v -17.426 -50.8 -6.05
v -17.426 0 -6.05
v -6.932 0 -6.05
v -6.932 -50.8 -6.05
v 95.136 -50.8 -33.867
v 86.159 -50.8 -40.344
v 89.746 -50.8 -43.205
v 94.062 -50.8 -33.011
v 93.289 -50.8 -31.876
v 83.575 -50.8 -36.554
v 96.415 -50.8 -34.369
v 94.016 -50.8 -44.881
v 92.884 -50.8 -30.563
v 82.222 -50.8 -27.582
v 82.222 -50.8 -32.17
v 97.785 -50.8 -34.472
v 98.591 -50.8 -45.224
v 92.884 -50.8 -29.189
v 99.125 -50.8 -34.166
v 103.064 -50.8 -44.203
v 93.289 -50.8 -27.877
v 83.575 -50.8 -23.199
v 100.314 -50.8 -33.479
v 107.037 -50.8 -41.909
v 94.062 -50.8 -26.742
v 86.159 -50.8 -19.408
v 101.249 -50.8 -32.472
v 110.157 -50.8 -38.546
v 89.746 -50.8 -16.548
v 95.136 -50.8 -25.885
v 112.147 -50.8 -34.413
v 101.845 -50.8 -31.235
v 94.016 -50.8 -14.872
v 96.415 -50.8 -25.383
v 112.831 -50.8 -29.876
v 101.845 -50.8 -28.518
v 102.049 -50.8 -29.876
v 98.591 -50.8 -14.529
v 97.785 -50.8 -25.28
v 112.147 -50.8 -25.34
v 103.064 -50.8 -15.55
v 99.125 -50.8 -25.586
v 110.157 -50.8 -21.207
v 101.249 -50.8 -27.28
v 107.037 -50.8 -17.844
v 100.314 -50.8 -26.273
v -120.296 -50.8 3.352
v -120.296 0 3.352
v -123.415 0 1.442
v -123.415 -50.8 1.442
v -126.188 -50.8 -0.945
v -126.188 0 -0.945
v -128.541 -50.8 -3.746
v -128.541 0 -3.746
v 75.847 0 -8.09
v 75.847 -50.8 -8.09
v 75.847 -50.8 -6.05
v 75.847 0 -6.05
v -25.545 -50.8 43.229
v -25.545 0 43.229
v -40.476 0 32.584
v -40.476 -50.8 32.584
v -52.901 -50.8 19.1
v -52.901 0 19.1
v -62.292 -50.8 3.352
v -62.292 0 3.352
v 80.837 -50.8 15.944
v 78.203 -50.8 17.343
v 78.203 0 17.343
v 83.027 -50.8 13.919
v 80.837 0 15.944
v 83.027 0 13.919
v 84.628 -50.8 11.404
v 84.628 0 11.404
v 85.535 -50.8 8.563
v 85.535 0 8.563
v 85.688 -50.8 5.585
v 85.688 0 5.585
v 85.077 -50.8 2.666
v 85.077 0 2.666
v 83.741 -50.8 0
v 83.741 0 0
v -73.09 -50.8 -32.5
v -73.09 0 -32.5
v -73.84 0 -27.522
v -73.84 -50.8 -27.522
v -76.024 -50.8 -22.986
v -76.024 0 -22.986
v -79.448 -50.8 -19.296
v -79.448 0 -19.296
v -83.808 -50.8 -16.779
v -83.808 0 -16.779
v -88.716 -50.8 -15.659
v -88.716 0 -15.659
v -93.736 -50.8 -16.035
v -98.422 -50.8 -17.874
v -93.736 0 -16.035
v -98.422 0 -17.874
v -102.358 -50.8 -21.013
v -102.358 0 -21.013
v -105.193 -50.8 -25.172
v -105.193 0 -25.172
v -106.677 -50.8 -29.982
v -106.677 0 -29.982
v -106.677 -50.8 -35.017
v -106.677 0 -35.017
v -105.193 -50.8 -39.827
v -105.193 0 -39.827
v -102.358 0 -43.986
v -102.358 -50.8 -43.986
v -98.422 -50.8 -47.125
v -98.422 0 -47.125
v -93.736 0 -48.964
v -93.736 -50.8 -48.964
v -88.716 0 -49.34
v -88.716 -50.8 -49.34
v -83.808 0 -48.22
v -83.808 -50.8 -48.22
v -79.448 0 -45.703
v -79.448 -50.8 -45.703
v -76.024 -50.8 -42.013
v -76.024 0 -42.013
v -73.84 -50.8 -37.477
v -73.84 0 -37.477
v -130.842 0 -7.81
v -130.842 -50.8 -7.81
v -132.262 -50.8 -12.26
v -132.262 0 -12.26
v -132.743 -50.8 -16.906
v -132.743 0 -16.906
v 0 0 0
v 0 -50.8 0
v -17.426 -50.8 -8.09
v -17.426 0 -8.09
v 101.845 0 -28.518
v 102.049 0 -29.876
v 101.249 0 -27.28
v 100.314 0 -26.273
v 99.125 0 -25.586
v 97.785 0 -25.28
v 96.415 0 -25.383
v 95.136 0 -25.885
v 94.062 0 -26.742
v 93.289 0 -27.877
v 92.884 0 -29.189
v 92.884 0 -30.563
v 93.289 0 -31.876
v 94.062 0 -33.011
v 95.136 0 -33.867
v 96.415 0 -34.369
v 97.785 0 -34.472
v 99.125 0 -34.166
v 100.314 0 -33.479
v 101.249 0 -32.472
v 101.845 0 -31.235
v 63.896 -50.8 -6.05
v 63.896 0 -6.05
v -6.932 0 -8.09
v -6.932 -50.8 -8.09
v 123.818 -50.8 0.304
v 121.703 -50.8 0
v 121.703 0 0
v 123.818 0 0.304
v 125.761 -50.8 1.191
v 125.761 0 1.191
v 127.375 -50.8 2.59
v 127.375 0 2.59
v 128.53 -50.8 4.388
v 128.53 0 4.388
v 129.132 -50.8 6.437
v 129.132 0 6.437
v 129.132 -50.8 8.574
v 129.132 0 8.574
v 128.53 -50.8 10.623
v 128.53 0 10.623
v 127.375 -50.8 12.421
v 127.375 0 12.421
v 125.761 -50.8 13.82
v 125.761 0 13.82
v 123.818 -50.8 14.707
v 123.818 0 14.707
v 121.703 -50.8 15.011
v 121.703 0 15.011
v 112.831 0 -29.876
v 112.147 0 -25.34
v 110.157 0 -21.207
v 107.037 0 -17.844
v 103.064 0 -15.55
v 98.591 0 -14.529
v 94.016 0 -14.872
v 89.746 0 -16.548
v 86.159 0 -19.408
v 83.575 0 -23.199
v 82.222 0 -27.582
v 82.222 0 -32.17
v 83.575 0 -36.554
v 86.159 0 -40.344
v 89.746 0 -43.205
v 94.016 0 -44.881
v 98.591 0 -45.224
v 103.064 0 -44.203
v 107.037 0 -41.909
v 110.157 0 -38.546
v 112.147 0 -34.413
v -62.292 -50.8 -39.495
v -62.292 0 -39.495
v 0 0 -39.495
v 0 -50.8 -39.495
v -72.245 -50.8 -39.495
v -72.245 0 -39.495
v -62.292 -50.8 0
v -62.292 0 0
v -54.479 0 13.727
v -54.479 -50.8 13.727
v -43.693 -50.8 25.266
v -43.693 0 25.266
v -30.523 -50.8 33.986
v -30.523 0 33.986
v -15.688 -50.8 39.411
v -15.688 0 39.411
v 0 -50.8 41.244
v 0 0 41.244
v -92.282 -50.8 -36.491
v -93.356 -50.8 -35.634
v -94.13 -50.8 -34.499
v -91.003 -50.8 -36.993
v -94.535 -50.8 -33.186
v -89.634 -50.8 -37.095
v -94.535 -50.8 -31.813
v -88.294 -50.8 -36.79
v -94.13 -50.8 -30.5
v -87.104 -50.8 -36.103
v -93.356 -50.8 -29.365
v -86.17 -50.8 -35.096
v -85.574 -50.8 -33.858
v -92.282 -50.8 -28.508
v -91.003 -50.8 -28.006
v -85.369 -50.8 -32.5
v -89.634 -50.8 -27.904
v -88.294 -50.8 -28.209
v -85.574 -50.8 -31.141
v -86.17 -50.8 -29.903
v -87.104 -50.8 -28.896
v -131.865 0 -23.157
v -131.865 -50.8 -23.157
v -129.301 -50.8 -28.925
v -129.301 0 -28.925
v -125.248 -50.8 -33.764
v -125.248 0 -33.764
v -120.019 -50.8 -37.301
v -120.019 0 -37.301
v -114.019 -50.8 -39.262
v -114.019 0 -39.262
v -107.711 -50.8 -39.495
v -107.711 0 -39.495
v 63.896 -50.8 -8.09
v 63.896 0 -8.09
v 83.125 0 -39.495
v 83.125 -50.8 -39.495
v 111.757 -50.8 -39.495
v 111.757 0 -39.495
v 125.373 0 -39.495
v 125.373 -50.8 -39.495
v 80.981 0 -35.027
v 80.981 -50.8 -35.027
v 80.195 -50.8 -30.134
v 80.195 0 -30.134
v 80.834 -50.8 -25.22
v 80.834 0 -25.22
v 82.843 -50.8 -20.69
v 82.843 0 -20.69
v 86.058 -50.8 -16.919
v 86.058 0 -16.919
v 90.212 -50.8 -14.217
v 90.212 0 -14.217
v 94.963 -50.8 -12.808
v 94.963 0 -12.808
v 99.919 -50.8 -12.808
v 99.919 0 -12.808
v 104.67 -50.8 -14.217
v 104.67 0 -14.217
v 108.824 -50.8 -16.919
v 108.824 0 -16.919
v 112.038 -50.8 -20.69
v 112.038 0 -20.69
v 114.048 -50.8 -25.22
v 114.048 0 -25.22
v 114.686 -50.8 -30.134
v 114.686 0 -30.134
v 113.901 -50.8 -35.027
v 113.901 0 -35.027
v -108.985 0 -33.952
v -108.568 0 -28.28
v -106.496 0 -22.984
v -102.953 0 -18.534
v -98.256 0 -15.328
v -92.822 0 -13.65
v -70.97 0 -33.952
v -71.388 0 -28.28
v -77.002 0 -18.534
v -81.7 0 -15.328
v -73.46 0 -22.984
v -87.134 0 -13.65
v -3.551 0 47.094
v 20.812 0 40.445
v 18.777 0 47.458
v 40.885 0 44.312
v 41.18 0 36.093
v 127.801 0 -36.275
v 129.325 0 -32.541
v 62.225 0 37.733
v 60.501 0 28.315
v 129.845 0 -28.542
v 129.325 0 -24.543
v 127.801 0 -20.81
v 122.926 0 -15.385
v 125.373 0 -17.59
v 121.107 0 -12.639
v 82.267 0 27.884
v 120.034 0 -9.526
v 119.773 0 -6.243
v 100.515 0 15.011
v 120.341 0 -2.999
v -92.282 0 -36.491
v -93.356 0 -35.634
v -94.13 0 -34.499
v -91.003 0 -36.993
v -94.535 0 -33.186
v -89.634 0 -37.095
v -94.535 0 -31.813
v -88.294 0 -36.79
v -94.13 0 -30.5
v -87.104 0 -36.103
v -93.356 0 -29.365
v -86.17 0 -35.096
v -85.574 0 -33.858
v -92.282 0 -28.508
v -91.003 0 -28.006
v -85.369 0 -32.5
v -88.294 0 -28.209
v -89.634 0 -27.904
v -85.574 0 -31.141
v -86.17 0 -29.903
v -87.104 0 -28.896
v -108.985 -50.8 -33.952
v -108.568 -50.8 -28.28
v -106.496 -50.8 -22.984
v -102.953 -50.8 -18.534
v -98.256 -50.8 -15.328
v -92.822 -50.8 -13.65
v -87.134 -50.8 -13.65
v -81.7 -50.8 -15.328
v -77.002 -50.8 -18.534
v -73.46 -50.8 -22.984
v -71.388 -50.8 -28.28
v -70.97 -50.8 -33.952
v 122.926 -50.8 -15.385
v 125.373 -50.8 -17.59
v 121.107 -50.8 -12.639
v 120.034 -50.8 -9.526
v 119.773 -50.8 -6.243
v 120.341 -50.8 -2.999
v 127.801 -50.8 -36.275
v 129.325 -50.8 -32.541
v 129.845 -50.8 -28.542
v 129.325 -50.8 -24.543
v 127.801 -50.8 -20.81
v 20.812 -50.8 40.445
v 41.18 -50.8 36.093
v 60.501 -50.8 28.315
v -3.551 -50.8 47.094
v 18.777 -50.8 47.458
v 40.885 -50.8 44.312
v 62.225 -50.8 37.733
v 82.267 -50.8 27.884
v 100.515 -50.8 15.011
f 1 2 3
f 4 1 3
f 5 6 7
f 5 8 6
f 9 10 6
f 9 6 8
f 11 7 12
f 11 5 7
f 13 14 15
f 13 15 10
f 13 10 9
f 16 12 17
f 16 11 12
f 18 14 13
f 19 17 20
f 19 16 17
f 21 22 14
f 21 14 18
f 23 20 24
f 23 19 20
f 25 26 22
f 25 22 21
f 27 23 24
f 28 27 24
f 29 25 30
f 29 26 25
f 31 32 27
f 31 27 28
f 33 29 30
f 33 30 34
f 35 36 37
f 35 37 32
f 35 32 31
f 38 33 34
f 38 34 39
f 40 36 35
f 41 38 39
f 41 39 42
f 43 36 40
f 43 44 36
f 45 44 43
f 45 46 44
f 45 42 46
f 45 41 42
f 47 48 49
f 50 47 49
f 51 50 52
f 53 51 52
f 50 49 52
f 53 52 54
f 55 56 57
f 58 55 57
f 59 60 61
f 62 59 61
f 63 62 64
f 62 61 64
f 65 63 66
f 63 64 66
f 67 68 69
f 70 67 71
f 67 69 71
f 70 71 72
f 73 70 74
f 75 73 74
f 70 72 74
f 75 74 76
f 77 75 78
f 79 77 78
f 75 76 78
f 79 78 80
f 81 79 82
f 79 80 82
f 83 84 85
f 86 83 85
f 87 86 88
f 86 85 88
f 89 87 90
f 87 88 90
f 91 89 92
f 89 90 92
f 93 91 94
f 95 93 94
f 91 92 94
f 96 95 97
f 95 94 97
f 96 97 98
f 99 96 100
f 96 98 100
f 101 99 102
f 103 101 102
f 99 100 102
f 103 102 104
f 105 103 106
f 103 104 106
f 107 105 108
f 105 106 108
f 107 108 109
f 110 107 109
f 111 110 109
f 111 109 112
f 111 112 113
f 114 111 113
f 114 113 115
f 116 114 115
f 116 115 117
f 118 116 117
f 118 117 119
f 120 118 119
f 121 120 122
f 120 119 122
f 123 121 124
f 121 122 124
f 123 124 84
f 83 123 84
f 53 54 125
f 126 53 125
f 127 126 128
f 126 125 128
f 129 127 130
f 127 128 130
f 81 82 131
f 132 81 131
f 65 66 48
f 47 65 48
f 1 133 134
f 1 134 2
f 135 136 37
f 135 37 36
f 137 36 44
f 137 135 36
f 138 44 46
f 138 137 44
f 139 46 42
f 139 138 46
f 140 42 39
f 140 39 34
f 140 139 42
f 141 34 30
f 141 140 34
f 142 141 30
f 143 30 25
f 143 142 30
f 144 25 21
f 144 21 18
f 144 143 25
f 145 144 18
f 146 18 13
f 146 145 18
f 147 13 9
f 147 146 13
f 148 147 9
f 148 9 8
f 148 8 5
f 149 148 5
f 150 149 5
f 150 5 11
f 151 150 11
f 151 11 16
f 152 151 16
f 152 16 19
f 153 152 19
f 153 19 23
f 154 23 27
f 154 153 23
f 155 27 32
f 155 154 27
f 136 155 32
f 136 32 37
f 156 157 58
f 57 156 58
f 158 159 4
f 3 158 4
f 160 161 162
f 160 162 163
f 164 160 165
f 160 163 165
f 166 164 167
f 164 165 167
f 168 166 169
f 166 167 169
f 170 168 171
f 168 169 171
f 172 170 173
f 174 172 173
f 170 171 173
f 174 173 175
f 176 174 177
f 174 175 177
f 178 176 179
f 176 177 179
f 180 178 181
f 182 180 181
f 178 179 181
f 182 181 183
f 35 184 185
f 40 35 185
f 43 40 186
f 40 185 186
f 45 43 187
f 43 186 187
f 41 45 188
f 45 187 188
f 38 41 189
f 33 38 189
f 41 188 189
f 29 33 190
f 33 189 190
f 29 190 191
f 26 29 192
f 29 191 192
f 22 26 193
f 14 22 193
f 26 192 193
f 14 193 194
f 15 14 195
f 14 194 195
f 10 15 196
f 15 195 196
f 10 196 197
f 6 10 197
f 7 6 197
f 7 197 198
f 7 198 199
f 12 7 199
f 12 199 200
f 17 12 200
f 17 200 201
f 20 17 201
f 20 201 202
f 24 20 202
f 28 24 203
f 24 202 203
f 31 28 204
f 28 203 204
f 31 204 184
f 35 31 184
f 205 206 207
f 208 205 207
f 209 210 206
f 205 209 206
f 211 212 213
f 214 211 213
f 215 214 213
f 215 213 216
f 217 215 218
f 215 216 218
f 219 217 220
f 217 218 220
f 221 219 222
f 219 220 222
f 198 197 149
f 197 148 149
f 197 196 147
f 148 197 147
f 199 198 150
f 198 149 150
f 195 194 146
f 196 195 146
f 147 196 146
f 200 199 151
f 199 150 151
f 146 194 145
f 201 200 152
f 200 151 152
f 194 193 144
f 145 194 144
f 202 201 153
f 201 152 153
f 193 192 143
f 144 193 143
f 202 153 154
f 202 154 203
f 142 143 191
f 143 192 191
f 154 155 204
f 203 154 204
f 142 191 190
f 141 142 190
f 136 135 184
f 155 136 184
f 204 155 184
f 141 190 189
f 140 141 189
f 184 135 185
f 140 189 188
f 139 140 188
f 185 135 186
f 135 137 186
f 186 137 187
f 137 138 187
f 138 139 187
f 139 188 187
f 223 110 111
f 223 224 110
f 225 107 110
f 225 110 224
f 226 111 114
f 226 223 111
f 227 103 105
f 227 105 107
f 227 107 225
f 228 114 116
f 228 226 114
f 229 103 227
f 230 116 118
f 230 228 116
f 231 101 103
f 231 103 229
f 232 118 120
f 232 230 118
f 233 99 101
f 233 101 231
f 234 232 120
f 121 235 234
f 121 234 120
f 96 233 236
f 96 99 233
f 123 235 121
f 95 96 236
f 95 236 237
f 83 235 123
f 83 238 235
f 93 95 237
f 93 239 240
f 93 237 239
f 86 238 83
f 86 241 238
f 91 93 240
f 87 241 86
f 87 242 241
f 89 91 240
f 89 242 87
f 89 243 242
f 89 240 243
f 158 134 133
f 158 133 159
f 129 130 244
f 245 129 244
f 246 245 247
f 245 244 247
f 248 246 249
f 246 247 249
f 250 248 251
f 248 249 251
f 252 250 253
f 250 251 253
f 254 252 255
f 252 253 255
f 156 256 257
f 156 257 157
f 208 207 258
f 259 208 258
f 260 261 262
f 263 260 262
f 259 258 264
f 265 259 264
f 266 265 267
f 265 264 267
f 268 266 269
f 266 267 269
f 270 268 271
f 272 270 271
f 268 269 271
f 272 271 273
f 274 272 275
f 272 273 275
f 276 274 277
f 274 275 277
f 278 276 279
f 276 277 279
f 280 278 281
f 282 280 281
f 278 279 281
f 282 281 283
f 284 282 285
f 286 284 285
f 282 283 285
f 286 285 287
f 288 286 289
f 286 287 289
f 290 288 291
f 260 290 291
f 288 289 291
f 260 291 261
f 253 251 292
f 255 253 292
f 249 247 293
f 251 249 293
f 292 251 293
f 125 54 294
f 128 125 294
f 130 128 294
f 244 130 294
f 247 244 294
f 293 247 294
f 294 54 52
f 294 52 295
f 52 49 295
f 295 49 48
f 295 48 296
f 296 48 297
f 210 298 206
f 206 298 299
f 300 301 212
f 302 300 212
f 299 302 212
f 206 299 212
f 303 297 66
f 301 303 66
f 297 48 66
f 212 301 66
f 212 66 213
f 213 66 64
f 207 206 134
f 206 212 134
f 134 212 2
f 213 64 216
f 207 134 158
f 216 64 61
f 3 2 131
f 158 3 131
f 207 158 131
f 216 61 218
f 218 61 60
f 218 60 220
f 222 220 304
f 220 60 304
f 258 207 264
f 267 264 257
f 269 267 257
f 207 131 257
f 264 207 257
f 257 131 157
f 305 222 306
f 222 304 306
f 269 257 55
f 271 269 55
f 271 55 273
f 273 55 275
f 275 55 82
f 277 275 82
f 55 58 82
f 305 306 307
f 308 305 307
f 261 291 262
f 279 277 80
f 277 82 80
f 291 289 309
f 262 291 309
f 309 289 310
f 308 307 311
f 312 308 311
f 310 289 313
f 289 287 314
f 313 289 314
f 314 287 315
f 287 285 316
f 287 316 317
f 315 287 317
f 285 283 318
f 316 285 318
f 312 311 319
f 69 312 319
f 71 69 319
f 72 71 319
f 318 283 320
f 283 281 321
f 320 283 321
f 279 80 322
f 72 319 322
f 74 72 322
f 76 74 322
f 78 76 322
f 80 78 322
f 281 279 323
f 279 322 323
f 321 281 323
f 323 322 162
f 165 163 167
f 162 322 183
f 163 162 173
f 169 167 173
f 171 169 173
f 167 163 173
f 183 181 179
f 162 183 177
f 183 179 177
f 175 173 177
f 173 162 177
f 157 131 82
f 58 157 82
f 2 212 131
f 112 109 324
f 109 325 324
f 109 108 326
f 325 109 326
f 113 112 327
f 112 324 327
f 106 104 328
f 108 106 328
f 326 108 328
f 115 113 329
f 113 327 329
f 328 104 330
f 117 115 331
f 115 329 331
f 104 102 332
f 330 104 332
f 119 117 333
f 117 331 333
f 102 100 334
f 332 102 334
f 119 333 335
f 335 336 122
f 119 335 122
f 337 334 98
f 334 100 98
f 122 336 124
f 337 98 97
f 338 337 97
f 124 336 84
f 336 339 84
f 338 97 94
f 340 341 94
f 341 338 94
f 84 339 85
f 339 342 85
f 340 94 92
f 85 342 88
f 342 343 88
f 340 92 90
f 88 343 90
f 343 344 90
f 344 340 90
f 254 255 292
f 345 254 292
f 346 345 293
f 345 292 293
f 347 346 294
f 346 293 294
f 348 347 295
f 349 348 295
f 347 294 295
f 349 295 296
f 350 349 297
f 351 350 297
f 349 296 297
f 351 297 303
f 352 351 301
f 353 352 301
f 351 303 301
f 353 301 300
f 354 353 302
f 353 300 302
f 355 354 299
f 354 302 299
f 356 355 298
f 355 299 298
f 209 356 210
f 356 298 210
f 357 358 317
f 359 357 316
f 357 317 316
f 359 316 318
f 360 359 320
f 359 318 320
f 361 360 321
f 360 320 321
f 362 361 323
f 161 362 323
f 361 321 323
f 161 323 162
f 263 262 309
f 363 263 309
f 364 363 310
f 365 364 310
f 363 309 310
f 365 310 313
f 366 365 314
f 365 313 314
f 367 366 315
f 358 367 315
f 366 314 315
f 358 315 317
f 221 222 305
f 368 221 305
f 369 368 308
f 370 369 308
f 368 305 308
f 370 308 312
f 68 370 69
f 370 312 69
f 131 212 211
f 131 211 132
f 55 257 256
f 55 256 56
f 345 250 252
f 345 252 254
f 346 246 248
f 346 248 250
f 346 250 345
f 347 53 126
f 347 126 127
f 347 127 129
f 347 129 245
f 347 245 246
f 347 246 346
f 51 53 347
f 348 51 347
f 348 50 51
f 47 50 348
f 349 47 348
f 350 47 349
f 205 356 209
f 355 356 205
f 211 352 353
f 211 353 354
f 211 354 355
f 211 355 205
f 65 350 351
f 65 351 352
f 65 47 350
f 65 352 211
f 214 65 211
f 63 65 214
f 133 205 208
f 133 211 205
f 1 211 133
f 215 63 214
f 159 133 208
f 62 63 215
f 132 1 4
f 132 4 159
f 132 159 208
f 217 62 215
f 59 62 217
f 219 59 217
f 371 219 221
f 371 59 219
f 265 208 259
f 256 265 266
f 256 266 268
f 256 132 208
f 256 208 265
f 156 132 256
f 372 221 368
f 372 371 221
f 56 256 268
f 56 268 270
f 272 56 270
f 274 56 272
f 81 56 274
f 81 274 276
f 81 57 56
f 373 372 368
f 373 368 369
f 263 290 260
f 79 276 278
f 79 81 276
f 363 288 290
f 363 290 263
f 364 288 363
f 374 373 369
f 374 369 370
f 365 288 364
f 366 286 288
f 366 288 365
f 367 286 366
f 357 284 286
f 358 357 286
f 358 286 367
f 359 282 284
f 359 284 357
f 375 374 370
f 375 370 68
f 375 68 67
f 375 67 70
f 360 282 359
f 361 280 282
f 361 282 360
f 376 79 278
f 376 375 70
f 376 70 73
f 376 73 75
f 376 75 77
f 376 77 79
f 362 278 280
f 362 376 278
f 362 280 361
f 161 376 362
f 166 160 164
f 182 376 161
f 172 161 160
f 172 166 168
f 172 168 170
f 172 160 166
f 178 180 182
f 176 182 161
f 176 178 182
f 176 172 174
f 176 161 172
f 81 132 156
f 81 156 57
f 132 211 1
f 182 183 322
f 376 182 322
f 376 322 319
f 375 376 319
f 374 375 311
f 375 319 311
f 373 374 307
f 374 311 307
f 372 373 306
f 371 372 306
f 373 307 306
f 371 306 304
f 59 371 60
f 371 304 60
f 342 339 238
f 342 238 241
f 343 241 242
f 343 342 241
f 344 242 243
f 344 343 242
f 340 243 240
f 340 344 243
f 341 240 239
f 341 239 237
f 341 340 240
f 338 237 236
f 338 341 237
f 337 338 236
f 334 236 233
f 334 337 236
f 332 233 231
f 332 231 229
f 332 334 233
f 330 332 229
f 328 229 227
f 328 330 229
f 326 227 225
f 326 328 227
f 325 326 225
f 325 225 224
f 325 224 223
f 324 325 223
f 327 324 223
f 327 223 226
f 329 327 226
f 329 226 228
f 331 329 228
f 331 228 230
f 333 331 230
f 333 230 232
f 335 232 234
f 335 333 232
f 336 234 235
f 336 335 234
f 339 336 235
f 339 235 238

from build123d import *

# Parameters (mm, degrees)
F0_R     = 16.887977
F0_R_2   = 4.608627
F0_R_3   = 15.390351
F0_R_4   = 4.608633
F0_W     = 11.950485
F0_H     = 2.040328
F0_W_2   = 62.29246
F0_H_2   = 39.494921
F0_W_3   = 10.493115
F1_DEPTH = 50.8


with BuildPart() as f1:
    # F0 (on Front) → F1 (new body)
    with BuildSketch(Plane.XZ):
        with BuildLine():
            Line((-103.385788, -3.745581), (-128.54061, -3.745581))
            ThreePointArc((-128.54061, -3.745581), (-131.66662, -9.998291), (-132.742612, -16.905574))
            Line((-132.742612, -16.905574), (-110.034121, -16.905574))
            ThreePointArc((-110.034121, -16.905574), (-104.690656, -11.345713), (-103.385788, -3.745581))
        make_face()
        with Locations((-89.97792, -32.499507)):
            Circle(F0_R)
        with Locations((-89.97792, -32.499507)):
            Circle(F0_R_2, mode=Mode.SUBTRACT)
        with Locations((97.440779, -29.87623)):
            Circle(F0_R_3)
        with Locations((97.440779, -29.87623)):
            Circle(F0_R_4, mode=Mode.SUBTRACT)
        with BuildLine():
            Line((0, -39.494921), (64.50405, -39.494921))
            Line((64.50405, -39.494921), (83.158471, -13.26213))
            ThreePointArc((83.158471, -13.26213), (85.019224, -6.700045), (83.741426, 0))
            Line((83.741426, 0), (0, 0))
            Line((0, 0), (0, -39.494921))
        make_face()
        with Locations((69.871374, -7.069891)):
            Rectangle(F0_W, F0_H, mode=Mode.SUBTRACT)
        with Locations((-31.14623, -19.74746)):
            Rectangle(F0_W_2, F0_H_2)
        with Locations((-12.178954, -7.069891)):
            Rectangle(F0_W_3, F0_H, mode=Mode.SUBTRACT)
        with BuildLine():
            ThreePointArc((121.702991, 0), (129.208483, 7.505492), (121.702991, 15.010984))
            Line((121.702991, 15.010984), (100.514565, 15.010984))
            ThreePointArc((100.514565, 15.010984), (40.885283, 44.311942), (-25.54531, 43.228554))
            ThreePointArc((-25.54531, 43.228554), (-47.037325, 26.163972), (-62.29246, 3.351967))
            Line((-62.29246, 3.351967), (-120.296068, 3.351967))
            ThreePointArc((-120.296068, 3.351967), (-124.849638, 0.304191), (-128.54061, -3.745581))
            Line((-128.54061, -3.745581), (-103.385788, -3.745581))
            ThreePointArc((-103.385788, -3.745581), (-104.690656, -11.345713), (-110.034121, -16.905574))
            Line((-110.034121, -16.905574), (-132.742612, -16.905574))
            ThreePointArc((-132.742612, -16.905574), (-125.247939, -33.764261), (-107.710978, -39.494921))
            ThreePointArc((-107.710978, -39.494921), (-89.97792, -13.436528), (-72.244862, -39.494921))
            Line((-72.244862, -39.494921), (-62.29246, -39.494921))
            Line((-62.29246, -39.494921), (-62.29246, 0))
            ThreePointArc((-62.29246, 0), (-37.363419, 30.012007), (0, 41.243773))
            ThreePointArc((0, 41.243773), (41.1798, 36.092776), (78.203395, 17.342787))
            ThreePointArc((78.203395, 17.342787), (85.173049, 10.012774), (83.741426, 0))
            ThreePointArc((83.741426, 0), (85.019224, -6.700045), (83.158471, -13.26213))
            Line((83.158471, -13.26213), (64.50405, -39.494921))
            Line((64.50405, -39.494921), (83.124629, -39.494921))
            ThreePointArc((83.124629, -39.494921), (97.440779, -12.628873), (111.756929, -39.494921))
            Line((111.756929, -39.494921), (125.372797, -39.494921))
            ThreePointArc((125.372797, -39.494921), (129.844935, -28.542269), (125.372797, -17.589617))
            ThreePointArc((125.372797, -17.589617), (120.033847, -9.525875), (121.702991, 0))
        make_face()
    extrude(amount=F1_DEPTH)


solid = f1.part
